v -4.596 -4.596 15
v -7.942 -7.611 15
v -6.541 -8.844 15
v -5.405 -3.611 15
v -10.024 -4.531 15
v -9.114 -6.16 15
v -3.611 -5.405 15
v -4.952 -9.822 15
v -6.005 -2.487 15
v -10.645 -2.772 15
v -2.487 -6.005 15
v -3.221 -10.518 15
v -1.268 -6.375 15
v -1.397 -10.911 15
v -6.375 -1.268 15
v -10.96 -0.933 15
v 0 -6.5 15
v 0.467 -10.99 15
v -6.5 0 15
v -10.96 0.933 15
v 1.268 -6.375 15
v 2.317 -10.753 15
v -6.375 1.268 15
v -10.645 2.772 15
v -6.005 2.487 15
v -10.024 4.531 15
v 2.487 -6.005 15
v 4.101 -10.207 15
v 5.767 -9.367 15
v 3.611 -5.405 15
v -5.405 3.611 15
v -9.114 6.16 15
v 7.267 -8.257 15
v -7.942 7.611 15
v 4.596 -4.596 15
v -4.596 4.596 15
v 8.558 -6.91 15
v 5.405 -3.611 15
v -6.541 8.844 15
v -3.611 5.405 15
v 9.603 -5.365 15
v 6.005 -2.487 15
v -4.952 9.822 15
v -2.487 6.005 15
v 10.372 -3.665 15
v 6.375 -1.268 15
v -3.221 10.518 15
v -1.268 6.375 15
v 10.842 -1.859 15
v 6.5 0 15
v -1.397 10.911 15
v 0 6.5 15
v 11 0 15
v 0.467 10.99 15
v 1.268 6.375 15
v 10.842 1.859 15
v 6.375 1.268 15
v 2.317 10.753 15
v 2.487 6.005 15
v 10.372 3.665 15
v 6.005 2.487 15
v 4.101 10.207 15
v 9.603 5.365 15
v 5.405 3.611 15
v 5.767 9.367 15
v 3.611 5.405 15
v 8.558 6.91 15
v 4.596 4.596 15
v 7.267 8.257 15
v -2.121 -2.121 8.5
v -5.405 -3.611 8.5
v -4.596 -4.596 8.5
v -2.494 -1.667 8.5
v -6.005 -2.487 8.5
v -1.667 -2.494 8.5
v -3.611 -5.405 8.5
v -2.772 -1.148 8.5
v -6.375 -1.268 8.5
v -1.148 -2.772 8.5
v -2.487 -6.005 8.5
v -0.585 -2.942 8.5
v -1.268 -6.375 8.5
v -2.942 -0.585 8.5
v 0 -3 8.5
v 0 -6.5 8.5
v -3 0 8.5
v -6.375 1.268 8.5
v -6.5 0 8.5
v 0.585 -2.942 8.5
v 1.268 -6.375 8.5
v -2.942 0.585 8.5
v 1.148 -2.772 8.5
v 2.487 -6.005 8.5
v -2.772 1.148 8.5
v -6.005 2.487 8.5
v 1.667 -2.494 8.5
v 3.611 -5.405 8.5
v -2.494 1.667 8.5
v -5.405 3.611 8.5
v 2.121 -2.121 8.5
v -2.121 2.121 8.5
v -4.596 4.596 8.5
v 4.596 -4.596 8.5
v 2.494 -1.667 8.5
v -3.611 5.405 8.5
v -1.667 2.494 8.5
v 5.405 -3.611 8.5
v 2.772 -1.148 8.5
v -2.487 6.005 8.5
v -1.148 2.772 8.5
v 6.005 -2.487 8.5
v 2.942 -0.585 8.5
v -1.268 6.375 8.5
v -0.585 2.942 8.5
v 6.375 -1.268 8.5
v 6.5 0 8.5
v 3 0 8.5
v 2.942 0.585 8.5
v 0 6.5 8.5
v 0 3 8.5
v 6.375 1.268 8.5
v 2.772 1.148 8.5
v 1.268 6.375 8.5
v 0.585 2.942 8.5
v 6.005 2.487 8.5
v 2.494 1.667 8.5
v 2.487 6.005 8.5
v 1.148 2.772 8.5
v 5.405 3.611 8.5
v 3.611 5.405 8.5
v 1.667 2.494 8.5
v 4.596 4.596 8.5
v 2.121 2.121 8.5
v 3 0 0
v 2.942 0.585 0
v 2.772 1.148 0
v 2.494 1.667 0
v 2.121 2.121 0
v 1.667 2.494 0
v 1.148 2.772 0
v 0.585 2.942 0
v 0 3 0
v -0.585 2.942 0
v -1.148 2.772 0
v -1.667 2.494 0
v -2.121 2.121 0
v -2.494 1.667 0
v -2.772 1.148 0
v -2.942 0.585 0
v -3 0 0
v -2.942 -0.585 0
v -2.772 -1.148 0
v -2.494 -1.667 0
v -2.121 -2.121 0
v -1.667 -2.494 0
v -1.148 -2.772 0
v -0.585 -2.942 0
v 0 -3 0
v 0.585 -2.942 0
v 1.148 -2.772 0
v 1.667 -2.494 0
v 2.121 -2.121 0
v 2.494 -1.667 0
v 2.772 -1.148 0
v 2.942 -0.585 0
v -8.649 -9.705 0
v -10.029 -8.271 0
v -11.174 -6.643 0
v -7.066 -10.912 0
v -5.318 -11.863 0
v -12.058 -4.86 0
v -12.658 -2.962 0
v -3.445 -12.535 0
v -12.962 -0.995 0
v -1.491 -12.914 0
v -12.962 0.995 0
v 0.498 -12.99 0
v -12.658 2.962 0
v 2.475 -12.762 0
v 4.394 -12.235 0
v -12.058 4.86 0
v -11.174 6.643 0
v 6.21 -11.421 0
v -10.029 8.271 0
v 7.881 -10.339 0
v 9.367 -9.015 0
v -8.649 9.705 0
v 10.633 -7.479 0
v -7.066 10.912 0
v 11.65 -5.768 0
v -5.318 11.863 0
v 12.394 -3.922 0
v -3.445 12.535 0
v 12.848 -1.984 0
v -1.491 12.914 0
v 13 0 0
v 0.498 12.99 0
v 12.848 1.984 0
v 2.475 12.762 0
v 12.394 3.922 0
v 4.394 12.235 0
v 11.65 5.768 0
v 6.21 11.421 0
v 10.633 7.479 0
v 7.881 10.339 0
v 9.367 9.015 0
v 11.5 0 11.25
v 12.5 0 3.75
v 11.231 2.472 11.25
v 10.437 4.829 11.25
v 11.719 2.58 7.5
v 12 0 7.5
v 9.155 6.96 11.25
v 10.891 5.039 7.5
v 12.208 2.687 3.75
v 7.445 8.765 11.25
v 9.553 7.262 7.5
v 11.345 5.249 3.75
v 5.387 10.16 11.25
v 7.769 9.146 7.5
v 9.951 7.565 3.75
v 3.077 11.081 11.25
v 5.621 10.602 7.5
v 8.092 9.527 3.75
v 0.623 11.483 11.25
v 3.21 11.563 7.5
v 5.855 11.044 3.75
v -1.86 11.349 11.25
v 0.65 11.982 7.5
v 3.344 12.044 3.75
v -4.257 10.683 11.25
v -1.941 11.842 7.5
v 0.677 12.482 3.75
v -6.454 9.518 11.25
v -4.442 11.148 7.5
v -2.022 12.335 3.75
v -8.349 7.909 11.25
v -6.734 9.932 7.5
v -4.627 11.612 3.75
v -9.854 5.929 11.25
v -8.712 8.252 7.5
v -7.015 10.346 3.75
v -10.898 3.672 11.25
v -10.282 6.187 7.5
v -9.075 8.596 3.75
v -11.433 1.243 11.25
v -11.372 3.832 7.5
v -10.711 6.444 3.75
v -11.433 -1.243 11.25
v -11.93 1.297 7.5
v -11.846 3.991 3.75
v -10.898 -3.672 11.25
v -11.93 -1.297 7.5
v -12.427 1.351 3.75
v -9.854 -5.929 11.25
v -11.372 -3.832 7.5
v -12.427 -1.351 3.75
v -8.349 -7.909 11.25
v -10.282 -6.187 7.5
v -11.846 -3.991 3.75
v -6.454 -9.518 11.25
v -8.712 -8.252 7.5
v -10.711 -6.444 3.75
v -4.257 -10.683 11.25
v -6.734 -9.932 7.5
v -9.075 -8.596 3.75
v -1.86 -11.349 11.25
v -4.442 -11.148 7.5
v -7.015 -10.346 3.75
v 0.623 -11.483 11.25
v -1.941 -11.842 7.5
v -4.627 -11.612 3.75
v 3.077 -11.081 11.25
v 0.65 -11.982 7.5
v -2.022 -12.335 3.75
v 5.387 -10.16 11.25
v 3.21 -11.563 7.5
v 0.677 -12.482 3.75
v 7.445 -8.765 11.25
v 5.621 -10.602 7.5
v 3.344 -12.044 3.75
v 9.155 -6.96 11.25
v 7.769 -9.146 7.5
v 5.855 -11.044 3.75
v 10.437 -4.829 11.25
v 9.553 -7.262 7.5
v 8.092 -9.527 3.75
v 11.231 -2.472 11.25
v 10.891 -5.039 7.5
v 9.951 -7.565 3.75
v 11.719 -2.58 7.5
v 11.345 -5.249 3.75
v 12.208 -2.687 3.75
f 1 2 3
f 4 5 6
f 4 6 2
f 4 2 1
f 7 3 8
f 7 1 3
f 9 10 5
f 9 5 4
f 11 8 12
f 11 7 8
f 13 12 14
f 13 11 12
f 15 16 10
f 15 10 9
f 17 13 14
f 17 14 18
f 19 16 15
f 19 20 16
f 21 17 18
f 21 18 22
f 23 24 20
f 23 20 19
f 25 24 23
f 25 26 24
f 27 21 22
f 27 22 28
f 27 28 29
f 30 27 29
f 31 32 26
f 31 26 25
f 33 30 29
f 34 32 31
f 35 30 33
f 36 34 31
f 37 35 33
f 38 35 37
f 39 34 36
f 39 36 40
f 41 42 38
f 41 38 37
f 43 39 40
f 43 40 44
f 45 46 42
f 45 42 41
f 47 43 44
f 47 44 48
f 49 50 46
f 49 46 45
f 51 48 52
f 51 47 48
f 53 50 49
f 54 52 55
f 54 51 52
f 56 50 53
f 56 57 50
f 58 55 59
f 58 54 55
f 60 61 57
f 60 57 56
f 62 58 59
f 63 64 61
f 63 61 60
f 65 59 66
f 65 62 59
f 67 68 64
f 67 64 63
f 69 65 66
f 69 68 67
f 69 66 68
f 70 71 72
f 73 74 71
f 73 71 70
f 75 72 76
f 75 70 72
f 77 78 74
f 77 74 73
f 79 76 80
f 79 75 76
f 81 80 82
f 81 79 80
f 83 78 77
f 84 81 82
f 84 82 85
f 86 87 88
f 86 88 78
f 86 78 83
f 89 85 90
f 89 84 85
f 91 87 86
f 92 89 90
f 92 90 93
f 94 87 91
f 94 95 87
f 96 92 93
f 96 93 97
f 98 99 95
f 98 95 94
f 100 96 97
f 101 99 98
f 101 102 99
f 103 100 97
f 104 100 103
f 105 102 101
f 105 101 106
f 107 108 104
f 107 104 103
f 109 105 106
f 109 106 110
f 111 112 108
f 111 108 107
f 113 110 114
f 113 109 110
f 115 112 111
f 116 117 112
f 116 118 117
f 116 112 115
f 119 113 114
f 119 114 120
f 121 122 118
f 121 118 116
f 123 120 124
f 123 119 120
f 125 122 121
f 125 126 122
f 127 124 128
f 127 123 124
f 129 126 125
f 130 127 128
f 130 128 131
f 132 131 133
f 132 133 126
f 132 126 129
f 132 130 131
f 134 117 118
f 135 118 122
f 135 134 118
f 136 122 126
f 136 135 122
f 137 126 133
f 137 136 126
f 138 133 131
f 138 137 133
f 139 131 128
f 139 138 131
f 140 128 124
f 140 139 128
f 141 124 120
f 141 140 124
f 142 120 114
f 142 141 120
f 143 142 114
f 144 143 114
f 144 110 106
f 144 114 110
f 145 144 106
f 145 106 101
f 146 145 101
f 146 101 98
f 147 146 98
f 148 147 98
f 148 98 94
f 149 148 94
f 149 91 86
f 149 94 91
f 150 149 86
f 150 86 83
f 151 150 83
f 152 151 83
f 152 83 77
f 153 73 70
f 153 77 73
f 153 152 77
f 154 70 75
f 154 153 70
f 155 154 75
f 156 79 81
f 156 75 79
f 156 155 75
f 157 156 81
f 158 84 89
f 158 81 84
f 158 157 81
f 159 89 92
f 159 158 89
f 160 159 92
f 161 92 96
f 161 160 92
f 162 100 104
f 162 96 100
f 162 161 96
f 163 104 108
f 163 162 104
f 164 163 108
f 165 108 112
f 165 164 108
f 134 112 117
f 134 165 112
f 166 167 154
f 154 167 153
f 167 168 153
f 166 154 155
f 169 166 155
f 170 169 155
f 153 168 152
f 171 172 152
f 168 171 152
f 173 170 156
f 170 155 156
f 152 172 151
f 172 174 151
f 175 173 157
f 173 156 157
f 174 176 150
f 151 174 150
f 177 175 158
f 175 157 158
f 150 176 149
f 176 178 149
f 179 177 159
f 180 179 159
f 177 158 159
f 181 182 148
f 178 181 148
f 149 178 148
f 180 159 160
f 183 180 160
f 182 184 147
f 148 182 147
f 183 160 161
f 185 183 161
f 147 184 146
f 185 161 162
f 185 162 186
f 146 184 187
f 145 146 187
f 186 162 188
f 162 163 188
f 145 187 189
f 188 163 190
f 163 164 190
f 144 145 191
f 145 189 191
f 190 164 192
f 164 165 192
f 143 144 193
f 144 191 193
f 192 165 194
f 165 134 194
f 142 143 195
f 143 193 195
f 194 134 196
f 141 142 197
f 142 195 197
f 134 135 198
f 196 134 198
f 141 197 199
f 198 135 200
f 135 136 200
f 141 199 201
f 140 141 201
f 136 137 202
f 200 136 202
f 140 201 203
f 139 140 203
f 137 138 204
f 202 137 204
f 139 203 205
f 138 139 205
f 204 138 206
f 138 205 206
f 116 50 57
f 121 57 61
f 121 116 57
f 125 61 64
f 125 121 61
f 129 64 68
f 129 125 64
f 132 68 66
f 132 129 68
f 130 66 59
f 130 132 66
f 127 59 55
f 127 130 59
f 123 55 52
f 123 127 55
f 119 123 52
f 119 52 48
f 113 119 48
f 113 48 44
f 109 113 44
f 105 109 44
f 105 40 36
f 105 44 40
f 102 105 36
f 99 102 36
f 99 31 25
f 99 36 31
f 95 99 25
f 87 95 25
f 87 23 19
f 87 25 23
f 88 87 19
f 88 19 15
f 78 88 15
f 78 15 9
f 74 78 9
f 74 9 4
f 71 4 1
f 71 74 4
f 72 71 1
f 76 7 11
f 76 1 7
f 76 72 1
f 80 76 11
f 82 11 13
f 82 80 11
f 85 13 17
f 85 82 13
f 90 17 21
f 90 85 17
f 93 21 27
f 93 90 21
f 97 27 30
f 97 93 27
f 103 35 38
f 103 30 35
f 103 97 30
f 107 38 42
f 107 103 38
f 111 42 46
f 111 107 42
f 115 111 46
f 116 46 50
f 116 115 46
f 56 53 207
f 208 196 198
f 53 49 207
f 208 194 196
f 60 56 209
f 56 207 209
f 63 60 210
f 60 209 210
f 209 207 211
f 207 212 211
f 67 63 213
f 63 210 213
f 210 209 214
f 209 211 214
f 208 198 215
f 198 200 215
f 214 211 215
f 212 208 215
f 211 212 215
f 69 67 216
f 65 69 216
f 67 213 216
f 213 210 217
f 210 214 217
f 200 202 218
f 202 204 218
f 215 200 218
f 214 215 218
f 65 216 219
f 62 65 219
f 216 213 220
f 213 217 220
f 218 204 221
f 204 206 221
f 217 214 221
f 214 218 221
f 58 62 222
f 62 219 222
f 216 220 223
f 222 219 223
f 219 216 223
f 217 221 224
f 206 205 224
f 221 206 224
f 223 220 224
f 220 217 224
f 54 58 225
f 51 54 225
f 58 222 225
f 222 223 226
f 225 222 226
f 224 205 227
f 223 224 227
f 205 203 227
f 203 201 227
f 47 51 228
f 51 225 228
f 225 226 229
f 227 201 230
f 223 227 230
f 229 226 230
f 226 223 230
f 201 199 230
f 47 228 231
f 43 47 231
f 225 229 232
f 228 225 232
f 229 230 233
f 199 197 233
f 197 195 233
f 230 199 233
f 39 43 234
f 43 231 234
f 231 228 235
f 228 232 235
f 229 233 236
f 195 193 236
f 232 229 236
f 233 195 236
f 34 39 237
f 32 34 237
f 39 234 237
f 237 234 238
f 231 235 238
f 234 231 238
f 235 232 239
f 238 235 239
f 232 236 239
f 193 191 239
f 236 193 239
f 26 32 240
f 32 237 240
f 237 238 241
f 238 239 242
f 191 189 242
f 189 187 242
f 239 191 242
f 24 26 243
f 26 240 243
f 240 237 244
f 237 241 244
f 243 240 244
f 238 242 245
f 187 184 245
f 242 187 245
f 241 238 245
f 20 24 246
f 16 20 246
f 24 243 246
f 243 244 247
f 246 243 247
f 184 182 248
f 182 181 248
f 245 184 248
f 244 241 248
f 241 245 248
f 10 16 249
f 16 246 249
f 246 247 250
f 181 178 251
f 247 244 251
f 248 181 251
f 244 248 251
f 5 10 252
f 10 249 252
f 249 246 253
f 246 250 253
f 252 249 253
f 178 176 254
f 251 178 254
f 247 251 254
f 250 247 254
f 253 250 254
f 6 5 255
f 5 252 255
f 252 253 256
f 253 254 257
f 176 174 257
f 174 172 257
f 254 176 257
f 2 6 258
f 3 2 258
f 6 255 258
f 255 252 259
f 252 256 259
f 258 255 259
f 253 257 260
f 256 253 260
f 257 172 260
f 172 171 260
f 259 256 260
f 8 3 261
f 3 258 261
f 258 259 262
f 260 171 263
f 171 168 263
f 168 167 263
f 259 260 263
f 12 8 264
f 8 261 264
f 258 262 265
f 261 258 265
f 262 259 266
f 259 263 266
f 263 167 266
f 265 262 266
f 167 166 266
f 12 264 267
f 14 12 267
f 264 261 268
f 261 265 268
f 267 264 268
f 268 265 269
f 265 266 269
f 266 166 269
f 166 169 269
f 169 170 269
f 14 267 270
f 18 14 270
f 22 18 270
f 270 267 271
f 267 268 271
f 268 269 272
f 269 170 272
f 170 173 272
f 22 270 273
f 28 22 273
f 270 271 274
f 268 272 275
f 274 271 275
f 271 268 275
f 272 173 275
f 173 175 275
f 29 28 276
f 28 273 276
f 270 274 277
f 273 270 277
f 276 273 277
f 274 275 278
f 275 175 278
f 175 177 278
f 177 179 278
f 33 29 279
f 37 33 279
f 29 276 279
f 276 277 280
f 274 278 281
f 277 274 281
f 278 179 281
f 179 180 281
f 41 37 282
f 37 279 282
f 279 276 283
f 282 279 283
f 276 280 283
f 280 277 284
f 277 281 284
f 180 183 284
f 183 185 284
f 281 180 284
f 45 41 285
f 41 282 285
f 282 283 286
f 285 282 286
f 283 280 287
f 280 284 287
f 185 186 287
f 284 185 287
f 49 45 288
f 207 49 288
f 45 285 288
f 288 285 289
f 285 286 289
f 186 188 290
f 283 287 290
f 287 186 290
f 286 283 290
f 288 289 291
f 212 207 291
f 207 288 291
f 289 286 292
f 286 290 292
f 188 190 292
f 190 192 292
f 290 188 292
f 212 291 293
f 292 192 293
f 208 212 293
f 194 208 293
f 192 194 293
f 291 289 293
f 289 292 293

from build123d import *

# Parameters (mm, degrees)
SKETCH001_R     = 11
SKETCH_R        = 13
SKETCH002_R     = 3
POCKET_DEPTH    = 15.001
SKETCH003_R     = 6.5
POCKET001_DEPTH = 6.501


with BuildPart() as part:
    # Sketch001 (on DatumPlane) → AdditiveLoft section 0
    with BuildSketch(Plane.XY.offset(15)):
        Circle(SKETCH001_R)
    # Sketch → AdditiveLoft section 1
    with BuildSketch(Plane.XY):
        Circle(SKETCH_R)
    loft()

    # Sketch002 → Pocket (cut, through all)
    with BuildSketch(Plane.XY):
        Circle(SKETCH002_R)
    extrude(amount=POCKET_DEPTH, mode=Mode.SUBTRACT)

    # Sketch003 (on DatumPlane) → Pocket001 (cut, through all)
    with BuildSketch(Plane.XY.offset(8.5)):
        Circle(SKETCH003_R)
    extrude(amount=POCKET001_DEPTH, mode=Mode.SUBTRACT)


solid = part.part
